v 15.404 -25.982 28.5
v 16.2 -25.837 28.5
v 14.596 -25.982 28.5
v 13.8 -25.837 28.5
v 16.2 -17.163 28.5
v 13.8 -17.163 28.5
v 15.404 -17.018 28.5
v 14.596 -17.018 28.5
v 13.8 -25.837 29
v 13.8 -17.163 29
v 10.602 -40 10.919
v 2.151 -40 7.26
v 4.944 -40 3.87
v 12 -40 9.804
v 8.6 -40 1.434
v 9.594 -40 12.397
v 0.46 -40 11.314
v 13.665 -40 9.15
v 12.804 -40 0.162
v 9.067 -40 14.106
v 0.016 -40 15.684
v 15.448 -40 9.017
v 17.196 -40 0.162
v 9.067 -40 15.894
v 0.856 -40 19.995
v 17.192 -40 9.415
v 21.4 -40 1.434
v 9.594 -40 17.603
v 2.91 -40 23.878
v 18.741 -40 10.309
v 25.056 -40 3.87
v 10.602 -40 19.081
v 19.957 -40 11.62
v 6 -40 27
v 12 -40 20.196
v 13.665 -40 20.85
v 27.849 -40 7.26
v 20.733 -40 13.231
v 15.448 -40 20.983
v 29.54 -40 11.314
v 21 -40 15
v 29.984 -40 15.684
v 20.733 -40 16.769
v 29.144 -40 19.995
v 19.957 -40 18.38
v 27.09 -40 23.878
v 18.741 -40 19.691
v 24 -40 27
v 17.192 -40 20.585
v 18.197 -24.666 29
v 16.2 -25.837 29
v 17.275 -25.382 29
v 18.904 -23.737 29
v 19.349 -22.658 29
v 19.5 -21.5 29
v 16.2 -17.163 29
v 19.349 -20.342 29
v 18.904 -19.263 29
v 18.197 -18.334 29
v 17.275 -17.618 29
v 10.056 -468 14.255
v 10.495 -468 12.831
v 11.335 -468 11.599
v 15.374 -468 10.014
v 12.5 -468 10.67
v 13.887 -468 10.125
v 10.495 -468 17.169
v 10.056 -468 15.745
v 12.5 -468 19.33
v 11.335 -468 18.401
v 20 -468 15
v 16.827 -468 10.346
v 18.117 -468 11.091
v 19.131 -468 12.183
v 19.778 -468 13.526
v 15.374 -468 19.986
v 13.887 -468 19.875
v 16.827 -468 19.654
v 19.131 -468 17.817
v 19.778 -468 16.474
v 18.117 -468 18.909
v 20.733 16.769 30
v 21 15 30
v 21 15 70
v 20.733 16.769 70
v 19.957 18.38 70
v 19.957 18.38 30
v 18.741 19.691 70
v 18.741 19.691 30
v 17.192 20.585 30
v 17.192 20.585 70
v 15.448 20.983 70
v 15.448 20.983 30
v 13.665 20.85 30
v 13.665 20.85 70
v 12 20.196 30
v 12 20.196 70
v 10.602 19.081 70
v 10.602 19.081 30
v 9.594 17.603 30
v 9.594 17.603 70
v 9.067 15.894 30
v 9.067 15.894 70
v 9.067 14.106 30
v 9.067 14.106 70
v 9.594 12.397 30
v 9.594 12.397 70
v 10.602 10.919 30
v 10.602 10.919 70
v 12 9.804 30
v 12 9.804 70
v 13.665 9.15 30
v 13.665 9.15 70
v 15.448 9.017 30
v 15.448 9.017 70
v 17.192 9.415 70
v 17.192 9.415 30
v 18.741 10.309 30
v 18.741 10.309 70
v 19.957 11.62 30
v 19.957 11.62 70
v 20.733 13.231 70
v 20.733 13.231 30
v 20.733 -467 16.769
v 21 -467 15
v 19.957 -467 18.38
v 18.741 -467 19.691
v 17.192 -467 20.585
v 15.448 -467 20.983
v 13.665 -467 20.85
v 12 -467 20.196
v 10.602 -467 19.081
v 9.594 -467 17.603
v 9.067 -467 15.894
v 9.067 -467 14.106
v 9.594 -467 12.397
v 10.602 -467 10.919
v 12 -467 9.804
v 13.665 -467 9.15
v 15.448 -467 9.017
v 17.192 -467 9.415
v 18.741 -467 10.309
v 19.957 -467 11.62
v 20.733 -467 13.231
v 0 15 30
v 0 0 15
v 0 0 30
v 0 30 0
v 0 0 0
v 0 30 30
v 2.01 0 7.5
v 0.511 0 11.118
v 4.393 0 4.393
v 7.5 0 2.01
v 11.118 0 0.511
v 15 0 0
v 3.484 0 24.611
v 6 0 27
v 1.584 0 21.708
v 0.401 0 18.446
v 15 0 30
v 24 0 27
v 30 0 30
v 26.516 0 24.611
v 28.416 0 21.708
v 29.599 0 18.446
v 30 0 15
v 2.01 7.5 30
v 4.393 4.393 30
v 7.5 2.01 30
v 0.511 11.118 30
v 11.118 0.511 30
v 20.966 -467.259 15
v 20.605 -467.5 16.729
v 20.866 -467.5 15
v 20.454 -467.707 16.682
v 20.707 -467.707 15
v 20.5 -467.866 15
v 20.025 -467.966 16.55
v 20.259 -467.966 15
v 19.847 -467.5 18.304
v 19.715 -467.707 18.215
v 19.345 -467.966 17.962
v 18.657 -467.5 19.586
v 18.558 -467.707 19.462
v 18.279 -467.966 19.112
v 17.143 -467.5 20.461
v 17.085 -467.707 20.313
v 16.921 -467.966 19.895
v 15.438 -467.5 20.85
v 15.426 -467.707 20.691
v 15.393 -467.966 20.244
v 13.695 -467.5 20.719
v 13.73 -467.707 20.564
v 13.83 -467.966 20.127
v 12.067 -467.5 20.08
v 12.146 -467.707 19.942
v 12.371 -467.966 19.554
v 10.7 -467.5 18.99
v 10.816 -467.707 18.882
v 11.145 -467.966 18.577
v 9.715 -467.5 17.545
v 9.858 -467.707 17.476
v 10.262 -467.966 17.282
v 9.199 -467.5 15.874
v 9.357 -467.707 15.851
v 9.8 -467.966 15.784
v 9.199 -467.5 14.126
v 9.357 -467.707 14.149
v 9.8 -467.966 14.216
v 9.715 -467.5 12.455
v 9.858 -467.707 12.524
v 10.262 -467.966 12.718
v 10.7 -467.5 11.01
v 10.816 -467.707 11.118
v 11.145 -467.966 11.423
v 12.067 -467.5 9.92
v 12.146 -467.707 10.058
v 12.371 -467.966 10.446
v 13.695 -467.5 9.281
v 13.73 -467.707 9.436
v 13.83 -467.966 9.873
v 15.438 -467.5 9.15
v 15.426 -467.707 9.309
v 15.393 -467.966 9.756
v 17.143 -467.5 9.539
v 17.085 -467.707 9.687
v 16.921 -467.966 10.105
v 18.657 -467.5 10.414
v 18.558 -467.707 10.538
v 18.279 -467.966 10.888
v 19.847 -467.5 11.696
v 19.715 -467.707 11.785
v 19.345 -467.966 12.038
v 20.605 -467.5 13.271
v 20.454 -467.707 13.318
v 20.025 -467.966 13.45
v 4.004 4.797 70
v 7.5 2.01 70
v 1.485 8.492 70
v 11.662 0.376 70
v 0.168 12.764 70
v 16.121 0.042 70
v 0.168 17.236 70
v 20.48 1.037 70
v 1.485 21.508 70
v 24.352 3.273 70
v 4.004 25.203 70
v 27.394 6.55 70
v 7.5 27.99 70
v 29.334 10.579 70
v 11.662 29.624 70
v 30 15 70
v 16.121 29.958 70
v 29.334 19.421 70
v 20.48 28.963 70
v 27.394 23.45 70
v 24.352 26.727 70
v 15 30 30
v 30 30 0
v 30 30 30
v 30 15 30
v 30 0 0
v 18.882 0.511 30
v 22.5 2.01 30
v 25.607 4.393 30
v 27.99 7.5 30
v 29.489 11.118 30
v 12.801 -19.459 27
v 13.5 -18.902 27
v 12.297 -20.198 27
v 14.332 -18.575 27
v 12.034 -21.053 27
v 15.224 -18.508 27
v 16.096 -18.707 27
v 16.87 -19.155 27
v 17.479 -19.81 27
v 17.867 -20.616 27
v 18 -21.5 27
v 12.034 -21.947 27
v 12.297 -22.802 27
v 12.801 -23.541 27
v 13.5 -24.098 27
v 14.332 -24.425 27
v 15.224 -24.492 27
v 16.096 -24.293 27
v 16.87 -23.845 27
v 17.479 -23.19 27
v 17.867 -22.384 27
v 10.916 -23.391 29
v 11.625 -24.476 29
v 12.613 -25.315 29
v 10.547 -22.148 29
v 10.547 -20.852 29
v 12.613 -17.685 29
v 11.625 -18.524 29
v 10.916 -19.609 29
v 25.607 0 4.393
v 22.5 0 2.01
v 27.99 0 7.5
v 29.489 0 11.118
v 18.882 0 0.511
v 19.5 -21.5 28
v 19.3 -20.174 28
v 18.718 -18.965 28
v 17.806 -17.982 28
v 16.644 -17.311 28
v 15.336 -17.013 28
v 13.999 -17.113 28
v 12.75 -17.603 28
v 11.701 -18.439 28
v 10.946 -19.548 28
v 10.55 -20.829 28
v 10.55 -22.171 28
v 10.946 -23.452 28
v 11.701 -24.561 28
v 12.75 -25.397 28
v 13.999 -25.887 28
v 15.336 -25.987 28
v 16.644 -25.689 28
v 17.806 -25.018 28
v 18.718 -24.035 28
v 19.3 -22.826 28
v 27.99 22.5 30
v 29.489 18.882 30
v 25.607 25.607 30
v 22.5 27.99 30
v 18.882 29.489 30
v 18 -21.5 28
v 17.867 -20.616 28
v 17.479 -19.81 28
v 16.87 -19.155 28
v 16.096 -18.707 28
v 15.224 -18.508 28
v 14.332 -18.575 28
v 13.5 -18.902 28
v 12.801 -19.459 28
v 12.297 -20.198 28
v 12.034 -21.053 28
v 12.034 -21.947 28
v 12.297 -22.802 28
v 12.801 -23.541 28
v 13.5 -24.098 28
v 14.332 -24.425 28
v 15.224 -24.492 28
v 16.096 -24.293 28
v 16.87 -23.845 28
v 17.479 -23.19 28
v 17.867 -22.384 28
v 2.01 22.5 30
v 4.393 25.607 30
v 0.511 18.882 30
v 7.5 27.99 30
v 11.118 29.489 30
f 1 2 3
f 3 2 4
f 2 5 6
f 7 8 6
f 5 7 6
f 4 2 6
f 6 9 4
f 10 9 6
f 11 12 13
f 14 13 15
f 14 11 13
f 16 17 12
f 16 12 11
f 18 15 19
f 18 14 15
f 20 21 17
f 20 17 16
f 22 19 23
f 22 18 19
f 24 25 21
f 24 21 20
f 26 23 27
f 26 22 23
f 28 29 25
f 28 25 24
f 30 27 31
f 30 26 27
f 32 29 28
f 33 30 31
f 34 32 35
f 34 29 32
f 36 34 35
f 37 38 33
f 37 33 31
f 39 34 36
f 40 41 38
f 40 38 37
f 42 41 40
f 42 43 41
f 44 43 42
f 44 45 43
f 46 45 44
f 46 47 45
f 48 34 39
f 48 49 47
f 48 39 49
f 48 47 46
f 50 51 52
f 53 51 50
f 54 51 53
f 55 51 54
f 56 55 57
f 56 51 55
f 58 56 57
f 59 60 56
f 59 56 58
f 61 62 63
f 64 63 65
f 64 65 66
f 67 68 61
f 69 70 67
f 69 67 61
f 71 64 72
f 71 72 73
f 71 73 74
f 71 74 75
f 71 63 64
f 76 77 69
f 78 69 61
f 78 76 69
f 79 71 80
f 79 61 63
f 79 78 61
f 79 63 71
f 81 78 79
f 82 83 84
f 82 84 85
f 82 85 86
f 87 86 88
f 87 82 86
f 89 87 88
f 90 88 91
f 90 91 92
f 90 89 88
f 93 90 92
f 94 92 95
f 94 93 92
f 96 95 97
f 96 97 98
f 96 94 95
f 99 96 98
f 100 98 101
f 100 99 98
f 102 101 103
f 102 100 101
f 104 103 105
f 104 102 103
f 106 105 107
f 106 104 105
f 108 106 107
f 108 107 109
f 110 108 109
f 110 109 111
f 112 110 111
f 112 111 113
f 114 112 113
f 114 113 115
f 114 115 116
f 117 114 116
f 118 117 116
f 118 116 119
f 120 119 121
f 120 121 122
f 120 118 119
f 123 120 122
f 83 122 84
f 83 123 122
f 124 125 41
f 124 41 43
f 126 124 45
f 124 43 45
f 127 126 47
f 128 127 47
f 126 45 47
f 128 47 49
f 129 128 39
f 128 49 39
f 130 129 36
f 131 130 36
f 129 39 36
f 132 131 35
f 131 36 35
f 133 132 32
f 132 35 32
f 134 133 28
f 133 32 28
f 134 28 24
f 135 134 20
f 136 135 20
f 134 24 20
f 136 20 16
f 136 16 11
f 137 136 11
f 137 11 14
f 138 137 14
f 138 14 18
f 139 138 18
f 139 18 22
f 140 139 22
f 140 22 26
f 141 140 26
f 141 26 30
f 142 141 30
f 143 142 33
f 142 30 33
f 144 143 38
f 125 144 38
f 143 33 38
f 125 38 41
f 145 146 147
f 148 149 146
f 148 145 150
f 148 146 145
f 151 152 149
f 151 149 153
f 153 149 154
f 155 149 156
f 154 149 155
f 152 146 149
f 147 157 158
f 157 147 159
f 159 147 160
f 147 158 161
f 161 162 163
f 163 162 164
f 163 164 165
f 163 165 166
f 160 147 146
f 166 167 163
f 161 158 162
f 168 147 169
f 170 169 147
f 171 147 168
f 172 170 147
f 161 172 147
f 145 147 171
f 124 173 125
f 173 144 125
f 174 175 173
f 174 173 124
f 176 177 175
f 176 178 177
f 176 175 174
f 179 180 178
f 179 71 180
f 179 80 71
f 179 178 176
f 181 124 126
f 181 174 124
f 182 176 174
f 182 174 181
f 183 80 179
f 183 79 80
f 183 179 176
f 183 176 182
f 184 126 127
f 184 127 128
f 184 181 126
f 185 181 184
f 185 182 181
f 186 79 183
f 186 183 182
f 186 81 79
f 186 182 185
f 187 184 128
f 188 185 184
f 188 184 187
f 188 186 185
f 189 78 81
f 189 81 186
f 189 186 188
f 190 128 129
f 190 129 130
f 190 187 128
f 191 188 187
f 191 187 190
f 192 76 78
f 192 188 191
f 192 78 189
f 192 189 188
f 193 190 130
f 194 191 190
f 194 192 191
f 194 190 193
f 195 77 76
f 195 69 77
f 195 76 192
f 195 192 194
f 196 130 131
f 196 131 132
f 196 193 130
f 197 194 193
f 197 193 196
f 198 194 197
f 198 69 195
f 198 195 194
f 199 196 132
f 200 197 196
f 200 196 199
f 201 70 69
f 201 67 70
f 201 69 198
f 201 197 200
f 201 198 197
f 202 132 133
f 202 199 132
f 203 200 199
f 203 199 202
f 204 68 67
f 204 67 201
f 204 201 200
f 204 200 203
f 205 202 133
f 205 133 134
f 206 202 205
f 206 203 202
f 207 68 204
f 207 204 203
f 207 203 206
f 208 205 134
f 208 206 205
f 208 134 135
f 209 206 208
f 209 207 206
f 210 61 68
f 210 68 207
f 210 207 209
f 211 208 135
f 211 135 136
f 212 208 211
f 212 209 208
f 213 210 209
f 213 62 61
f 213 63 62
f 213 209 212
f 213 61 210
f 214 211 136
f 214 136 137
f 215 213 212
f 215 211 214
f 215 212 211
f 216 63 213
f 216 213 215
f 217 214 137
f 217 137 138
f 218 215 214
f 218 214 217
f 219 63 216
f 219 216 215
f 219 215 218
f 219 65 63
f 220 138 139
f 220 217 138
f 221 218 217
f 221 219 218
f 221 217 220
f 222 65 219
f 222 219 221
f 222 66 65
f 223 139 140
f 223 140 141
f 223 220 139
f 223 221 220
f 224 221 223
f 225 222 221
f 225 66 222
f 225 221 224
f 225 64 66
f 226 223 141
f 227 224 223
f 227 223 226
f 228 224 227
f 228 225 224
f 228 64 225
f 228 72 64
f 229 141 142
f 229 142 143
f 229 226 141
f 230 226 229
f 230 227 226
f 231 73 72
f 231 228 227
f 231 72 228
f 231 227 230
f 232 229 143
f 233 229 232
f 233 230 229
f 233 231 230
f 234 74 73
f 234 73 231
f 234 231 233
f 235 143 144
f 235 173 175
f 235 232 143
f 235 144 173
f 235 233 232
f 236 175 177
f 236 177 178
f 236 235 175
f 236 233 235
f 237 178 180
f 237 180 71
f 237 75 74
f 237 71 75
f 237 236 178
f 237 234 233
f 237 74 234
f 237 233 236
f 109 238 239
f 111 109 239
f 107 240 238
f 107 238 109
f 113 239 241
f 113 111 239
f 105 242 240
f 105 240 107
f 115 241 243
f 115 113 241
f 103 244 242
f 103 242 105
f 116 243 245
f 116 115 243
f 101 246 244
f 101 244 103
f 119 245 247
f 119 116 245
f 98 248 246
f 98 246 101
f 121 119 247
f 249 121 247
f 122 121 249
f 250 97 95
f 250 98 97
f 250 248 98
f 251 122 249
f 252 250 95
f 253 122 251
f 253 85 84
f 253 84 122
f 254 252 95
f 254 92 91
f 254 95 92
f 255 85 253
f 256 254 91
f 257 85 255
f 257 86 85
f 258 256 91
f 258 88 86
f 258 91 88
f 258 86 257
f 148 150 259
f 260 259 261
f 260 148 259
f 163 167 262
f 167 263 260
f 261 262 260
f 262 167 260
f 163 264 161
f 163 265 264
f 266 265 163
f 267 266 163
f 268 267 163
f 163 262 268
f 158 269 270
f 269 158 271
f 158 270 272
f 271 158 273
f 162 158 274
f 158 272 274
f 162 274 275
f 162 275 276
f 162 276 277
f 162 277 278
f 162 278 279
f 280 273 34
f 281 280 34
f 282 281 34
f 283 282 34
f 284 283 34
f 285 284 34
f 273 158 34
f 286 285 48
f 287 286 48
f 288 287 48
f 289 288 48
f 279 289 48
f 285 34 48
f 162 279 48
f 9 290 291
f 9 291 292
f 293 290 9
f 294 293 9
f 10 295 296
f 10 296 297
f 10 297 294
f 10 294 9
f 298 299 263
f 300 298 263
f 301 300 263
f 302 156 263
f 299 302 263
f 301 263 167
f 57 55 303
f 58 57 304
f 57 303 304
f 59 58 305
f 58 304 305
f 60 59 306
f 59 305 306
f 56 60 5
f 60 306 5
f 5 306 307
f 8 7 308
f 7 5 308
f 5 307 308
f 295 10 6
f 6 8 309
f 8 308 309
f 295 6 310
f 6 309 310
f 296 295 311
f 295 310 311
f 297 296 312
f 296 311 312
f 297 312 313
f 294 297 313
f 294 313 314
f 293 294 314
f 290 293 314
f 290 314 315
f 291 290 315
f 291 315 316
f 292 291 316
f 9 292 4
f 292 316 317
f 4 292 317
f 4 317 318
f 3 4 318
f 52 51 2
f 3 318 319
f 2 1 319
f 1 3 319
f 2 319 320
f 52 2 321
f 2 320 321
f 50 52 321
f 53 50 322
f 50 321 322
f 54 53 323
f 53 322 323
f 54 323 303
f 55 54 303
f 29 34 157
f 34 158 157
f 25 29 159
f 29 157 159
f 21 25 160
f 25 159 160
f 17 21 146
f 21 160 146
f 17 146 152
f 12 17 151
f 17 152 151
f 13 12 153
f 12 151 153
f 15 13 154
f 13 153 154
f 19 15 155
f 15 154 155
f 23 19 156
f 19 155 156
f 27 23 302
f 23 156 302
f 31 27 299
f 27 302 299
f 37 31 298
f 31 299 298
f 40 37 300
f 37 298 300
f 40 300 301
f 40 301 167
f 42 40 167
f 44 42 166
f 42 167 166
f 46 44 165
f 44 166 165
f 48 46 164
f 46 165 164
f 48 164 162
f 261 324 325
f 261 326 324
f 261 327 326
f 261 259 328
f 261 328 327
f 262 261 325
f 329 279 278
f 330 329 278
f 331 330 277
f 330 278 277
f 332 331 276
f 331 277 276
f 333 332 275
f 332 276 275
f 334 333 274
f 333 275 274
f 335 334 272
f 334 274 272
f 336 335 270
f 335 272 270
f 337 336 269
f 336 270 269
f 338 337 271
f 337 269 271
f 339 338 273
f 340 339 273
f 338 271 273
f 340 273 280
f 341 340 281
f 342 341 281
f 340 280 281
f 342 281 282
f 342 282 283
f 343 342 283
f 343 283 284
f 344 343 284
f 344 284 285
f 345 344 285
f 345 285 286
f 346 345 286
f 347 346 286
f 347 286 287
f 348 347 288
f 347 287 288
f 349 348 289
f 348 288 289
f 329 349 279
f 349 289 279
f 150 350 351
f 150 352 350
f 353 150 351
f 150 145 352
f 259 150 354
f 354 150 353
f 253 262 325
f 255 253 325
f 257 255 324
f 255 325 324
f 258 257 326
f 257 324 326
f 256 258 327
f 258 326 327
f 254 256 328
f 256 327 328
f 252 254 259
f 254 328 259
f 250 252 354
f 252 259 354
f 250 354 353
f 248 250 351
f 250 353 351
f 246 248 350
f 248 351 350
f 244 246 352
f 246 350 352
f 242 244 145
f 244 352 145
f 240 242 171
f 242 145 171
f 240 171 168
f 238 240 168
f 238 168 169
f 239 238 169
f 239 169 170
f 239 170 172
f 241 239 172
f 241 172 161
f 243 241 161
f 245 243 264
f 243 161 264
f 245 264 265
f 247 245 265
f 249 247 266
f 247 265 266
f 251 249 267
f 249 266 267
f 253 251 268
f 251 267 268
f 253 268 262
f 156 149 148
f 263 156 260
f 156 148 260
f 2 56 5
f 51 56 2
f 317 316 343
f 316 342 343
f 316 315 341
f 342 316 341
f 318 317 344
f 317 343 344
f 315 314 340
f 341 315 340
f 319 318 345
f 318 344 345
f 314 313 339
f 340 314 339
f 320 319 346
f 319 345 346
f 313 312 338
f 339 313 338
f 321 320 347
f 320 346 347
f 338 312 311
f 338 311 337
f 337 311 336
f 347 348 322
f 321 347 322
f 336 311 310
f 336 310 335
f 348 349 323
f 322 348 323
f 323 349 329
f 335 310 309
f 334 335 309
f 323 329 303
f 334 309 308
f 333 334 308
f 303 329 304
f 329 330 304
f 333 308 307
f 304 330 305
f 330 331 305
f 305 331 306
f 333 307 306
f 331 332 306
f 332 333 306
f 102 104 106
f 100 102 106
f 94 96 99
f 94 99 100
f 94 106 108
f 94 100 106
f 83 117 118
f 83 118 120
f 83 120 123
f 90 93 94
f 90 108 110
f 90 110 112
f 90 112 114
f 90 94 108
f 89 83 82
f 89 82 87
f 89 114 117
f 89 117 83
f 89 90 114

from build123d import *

# Parameters (mm, degrees)
SKETCH3_W           = 30
SKETCH3_H           = 30
BOSS_EXTRUDE1_DEPTH = 30
SKETCH4_R           = 15
SKETCH4_R_2         = 6
BOSS_EXTRUDE2_DEPTH = 40
SKETCH5_R           = 15
BOSS_EXTRUDE3_DEPTH = 40
CUT_EXTRUDE4_DEPTH  = 40
SKETCH7_R           = 3
BOSS_EXTRUDE4_DEPTH = 1
SKETCH8_R           = 4.5
BOSS_EXTRUDE5_DEPTH = 1
CUT_EXTRUDE5_DEPTH  = 0.5
SKETCH10_R          = 6
BOSS_EXTRUDE6_DEPTH = 428
FILLET1_R           = 1


with BuildPart() as part:
    # Sketch3 → Boss-Extrude1 (new body)
    with BuildSketch(Plane.XY):
        with Locations((15, 15)):
            Rectangle(SKETCH3_W, SKETCH3_H)
    extrude(amount=BOSS_EXTRUDE1_DEPTH)

    # Sketch4 → Boss-Extrude2 (add)
    with BuildSketch(Plane.XY.offset(30)):
        with Locations((15, 15)):
            Circle(SKETCH4_R)
        with Locations((15, 15)):
            Circle(SKETCH4_R_2, mode=Mode.SUBTRACT)
    extrude(amount=BOSS_EXTRUDE2_DEPTH)

    # Sketch5 → Boss-Extrude3 (add)
    with BuildSketch(Plane.XZ):
        with Locations((15, 15)):
            Circle(SKETCH5_R)
    extrude(amount=BOSS_EXTRUDE3_DEPTH)

    # Sketch6 → Cut-Extrude4 (cut)
    with BuildSketch(Plane.XZ.offset(40)):
        with BuildLine():
            Line((6, 27), (24, 27))
            ThreePointArc((24, 27), (15, 30), (6, 27))
        make_face()
    extrude(amount=-CUT_EXTRUDE4_DEPTH, mode=Mode.SUBTRACT)

    # Sketch7 → Boss-Extrude4 (add)
    with BuildSketch(Plane.XY.offset(27)):
        with Locations((15, -21.5)):
            Circle(SKETCH7_R)
    extrude(amount=BOSS_EXTRUDE4_DEPTH)

    # Sketch8 → Boss-Extrude5 (add)
    with BuildSketch(Plane.XY.offset(28)):
        with Locations((15, -21.5)):
            Circle(SKETCH8_R)
    extrude(amount=BOSS_EXTRUDE5_DEPTH)

    # Sketch9 → Cut-Extrude5 (cut)
    with BuildSketch(Plane.XY.offset(29)):
        with BuildLine():
            Line((16.2, -17.162950312), (16.2, -25.837049688))
            ThreePointArc((16.2, -25.837049688), (15, -26), (13.8, -25.837049688))
            Line((13.8, -25.837049688), (13.8, -17.162950312))
            ThreePointArc((13.8, -17.162950312), (15, -17), (16.2, -17.162950312))
        make_face()
    extrude(amount=-CUT_EXTRUDE5_DEPTH, mode=Mode.SUBTRACT)

    # Sketch10 → Boss-Extrude6 (add)
    with BuildSketch(Plane.XZ.offset(40)):
        with Locations((15, 15)):
            Circle(SKETCH10_R)
    extrude(amount=BOSS_EXTRUDE6_DEPTH)

    # Fillet1
    fillet1_edges = [part.edges().sort_by_distance(p)[0] for p in [
        (9, -468, 15),
    ]]
    fillet(fillet1_edges, radius=FILLET1_R)


solid = part.part
